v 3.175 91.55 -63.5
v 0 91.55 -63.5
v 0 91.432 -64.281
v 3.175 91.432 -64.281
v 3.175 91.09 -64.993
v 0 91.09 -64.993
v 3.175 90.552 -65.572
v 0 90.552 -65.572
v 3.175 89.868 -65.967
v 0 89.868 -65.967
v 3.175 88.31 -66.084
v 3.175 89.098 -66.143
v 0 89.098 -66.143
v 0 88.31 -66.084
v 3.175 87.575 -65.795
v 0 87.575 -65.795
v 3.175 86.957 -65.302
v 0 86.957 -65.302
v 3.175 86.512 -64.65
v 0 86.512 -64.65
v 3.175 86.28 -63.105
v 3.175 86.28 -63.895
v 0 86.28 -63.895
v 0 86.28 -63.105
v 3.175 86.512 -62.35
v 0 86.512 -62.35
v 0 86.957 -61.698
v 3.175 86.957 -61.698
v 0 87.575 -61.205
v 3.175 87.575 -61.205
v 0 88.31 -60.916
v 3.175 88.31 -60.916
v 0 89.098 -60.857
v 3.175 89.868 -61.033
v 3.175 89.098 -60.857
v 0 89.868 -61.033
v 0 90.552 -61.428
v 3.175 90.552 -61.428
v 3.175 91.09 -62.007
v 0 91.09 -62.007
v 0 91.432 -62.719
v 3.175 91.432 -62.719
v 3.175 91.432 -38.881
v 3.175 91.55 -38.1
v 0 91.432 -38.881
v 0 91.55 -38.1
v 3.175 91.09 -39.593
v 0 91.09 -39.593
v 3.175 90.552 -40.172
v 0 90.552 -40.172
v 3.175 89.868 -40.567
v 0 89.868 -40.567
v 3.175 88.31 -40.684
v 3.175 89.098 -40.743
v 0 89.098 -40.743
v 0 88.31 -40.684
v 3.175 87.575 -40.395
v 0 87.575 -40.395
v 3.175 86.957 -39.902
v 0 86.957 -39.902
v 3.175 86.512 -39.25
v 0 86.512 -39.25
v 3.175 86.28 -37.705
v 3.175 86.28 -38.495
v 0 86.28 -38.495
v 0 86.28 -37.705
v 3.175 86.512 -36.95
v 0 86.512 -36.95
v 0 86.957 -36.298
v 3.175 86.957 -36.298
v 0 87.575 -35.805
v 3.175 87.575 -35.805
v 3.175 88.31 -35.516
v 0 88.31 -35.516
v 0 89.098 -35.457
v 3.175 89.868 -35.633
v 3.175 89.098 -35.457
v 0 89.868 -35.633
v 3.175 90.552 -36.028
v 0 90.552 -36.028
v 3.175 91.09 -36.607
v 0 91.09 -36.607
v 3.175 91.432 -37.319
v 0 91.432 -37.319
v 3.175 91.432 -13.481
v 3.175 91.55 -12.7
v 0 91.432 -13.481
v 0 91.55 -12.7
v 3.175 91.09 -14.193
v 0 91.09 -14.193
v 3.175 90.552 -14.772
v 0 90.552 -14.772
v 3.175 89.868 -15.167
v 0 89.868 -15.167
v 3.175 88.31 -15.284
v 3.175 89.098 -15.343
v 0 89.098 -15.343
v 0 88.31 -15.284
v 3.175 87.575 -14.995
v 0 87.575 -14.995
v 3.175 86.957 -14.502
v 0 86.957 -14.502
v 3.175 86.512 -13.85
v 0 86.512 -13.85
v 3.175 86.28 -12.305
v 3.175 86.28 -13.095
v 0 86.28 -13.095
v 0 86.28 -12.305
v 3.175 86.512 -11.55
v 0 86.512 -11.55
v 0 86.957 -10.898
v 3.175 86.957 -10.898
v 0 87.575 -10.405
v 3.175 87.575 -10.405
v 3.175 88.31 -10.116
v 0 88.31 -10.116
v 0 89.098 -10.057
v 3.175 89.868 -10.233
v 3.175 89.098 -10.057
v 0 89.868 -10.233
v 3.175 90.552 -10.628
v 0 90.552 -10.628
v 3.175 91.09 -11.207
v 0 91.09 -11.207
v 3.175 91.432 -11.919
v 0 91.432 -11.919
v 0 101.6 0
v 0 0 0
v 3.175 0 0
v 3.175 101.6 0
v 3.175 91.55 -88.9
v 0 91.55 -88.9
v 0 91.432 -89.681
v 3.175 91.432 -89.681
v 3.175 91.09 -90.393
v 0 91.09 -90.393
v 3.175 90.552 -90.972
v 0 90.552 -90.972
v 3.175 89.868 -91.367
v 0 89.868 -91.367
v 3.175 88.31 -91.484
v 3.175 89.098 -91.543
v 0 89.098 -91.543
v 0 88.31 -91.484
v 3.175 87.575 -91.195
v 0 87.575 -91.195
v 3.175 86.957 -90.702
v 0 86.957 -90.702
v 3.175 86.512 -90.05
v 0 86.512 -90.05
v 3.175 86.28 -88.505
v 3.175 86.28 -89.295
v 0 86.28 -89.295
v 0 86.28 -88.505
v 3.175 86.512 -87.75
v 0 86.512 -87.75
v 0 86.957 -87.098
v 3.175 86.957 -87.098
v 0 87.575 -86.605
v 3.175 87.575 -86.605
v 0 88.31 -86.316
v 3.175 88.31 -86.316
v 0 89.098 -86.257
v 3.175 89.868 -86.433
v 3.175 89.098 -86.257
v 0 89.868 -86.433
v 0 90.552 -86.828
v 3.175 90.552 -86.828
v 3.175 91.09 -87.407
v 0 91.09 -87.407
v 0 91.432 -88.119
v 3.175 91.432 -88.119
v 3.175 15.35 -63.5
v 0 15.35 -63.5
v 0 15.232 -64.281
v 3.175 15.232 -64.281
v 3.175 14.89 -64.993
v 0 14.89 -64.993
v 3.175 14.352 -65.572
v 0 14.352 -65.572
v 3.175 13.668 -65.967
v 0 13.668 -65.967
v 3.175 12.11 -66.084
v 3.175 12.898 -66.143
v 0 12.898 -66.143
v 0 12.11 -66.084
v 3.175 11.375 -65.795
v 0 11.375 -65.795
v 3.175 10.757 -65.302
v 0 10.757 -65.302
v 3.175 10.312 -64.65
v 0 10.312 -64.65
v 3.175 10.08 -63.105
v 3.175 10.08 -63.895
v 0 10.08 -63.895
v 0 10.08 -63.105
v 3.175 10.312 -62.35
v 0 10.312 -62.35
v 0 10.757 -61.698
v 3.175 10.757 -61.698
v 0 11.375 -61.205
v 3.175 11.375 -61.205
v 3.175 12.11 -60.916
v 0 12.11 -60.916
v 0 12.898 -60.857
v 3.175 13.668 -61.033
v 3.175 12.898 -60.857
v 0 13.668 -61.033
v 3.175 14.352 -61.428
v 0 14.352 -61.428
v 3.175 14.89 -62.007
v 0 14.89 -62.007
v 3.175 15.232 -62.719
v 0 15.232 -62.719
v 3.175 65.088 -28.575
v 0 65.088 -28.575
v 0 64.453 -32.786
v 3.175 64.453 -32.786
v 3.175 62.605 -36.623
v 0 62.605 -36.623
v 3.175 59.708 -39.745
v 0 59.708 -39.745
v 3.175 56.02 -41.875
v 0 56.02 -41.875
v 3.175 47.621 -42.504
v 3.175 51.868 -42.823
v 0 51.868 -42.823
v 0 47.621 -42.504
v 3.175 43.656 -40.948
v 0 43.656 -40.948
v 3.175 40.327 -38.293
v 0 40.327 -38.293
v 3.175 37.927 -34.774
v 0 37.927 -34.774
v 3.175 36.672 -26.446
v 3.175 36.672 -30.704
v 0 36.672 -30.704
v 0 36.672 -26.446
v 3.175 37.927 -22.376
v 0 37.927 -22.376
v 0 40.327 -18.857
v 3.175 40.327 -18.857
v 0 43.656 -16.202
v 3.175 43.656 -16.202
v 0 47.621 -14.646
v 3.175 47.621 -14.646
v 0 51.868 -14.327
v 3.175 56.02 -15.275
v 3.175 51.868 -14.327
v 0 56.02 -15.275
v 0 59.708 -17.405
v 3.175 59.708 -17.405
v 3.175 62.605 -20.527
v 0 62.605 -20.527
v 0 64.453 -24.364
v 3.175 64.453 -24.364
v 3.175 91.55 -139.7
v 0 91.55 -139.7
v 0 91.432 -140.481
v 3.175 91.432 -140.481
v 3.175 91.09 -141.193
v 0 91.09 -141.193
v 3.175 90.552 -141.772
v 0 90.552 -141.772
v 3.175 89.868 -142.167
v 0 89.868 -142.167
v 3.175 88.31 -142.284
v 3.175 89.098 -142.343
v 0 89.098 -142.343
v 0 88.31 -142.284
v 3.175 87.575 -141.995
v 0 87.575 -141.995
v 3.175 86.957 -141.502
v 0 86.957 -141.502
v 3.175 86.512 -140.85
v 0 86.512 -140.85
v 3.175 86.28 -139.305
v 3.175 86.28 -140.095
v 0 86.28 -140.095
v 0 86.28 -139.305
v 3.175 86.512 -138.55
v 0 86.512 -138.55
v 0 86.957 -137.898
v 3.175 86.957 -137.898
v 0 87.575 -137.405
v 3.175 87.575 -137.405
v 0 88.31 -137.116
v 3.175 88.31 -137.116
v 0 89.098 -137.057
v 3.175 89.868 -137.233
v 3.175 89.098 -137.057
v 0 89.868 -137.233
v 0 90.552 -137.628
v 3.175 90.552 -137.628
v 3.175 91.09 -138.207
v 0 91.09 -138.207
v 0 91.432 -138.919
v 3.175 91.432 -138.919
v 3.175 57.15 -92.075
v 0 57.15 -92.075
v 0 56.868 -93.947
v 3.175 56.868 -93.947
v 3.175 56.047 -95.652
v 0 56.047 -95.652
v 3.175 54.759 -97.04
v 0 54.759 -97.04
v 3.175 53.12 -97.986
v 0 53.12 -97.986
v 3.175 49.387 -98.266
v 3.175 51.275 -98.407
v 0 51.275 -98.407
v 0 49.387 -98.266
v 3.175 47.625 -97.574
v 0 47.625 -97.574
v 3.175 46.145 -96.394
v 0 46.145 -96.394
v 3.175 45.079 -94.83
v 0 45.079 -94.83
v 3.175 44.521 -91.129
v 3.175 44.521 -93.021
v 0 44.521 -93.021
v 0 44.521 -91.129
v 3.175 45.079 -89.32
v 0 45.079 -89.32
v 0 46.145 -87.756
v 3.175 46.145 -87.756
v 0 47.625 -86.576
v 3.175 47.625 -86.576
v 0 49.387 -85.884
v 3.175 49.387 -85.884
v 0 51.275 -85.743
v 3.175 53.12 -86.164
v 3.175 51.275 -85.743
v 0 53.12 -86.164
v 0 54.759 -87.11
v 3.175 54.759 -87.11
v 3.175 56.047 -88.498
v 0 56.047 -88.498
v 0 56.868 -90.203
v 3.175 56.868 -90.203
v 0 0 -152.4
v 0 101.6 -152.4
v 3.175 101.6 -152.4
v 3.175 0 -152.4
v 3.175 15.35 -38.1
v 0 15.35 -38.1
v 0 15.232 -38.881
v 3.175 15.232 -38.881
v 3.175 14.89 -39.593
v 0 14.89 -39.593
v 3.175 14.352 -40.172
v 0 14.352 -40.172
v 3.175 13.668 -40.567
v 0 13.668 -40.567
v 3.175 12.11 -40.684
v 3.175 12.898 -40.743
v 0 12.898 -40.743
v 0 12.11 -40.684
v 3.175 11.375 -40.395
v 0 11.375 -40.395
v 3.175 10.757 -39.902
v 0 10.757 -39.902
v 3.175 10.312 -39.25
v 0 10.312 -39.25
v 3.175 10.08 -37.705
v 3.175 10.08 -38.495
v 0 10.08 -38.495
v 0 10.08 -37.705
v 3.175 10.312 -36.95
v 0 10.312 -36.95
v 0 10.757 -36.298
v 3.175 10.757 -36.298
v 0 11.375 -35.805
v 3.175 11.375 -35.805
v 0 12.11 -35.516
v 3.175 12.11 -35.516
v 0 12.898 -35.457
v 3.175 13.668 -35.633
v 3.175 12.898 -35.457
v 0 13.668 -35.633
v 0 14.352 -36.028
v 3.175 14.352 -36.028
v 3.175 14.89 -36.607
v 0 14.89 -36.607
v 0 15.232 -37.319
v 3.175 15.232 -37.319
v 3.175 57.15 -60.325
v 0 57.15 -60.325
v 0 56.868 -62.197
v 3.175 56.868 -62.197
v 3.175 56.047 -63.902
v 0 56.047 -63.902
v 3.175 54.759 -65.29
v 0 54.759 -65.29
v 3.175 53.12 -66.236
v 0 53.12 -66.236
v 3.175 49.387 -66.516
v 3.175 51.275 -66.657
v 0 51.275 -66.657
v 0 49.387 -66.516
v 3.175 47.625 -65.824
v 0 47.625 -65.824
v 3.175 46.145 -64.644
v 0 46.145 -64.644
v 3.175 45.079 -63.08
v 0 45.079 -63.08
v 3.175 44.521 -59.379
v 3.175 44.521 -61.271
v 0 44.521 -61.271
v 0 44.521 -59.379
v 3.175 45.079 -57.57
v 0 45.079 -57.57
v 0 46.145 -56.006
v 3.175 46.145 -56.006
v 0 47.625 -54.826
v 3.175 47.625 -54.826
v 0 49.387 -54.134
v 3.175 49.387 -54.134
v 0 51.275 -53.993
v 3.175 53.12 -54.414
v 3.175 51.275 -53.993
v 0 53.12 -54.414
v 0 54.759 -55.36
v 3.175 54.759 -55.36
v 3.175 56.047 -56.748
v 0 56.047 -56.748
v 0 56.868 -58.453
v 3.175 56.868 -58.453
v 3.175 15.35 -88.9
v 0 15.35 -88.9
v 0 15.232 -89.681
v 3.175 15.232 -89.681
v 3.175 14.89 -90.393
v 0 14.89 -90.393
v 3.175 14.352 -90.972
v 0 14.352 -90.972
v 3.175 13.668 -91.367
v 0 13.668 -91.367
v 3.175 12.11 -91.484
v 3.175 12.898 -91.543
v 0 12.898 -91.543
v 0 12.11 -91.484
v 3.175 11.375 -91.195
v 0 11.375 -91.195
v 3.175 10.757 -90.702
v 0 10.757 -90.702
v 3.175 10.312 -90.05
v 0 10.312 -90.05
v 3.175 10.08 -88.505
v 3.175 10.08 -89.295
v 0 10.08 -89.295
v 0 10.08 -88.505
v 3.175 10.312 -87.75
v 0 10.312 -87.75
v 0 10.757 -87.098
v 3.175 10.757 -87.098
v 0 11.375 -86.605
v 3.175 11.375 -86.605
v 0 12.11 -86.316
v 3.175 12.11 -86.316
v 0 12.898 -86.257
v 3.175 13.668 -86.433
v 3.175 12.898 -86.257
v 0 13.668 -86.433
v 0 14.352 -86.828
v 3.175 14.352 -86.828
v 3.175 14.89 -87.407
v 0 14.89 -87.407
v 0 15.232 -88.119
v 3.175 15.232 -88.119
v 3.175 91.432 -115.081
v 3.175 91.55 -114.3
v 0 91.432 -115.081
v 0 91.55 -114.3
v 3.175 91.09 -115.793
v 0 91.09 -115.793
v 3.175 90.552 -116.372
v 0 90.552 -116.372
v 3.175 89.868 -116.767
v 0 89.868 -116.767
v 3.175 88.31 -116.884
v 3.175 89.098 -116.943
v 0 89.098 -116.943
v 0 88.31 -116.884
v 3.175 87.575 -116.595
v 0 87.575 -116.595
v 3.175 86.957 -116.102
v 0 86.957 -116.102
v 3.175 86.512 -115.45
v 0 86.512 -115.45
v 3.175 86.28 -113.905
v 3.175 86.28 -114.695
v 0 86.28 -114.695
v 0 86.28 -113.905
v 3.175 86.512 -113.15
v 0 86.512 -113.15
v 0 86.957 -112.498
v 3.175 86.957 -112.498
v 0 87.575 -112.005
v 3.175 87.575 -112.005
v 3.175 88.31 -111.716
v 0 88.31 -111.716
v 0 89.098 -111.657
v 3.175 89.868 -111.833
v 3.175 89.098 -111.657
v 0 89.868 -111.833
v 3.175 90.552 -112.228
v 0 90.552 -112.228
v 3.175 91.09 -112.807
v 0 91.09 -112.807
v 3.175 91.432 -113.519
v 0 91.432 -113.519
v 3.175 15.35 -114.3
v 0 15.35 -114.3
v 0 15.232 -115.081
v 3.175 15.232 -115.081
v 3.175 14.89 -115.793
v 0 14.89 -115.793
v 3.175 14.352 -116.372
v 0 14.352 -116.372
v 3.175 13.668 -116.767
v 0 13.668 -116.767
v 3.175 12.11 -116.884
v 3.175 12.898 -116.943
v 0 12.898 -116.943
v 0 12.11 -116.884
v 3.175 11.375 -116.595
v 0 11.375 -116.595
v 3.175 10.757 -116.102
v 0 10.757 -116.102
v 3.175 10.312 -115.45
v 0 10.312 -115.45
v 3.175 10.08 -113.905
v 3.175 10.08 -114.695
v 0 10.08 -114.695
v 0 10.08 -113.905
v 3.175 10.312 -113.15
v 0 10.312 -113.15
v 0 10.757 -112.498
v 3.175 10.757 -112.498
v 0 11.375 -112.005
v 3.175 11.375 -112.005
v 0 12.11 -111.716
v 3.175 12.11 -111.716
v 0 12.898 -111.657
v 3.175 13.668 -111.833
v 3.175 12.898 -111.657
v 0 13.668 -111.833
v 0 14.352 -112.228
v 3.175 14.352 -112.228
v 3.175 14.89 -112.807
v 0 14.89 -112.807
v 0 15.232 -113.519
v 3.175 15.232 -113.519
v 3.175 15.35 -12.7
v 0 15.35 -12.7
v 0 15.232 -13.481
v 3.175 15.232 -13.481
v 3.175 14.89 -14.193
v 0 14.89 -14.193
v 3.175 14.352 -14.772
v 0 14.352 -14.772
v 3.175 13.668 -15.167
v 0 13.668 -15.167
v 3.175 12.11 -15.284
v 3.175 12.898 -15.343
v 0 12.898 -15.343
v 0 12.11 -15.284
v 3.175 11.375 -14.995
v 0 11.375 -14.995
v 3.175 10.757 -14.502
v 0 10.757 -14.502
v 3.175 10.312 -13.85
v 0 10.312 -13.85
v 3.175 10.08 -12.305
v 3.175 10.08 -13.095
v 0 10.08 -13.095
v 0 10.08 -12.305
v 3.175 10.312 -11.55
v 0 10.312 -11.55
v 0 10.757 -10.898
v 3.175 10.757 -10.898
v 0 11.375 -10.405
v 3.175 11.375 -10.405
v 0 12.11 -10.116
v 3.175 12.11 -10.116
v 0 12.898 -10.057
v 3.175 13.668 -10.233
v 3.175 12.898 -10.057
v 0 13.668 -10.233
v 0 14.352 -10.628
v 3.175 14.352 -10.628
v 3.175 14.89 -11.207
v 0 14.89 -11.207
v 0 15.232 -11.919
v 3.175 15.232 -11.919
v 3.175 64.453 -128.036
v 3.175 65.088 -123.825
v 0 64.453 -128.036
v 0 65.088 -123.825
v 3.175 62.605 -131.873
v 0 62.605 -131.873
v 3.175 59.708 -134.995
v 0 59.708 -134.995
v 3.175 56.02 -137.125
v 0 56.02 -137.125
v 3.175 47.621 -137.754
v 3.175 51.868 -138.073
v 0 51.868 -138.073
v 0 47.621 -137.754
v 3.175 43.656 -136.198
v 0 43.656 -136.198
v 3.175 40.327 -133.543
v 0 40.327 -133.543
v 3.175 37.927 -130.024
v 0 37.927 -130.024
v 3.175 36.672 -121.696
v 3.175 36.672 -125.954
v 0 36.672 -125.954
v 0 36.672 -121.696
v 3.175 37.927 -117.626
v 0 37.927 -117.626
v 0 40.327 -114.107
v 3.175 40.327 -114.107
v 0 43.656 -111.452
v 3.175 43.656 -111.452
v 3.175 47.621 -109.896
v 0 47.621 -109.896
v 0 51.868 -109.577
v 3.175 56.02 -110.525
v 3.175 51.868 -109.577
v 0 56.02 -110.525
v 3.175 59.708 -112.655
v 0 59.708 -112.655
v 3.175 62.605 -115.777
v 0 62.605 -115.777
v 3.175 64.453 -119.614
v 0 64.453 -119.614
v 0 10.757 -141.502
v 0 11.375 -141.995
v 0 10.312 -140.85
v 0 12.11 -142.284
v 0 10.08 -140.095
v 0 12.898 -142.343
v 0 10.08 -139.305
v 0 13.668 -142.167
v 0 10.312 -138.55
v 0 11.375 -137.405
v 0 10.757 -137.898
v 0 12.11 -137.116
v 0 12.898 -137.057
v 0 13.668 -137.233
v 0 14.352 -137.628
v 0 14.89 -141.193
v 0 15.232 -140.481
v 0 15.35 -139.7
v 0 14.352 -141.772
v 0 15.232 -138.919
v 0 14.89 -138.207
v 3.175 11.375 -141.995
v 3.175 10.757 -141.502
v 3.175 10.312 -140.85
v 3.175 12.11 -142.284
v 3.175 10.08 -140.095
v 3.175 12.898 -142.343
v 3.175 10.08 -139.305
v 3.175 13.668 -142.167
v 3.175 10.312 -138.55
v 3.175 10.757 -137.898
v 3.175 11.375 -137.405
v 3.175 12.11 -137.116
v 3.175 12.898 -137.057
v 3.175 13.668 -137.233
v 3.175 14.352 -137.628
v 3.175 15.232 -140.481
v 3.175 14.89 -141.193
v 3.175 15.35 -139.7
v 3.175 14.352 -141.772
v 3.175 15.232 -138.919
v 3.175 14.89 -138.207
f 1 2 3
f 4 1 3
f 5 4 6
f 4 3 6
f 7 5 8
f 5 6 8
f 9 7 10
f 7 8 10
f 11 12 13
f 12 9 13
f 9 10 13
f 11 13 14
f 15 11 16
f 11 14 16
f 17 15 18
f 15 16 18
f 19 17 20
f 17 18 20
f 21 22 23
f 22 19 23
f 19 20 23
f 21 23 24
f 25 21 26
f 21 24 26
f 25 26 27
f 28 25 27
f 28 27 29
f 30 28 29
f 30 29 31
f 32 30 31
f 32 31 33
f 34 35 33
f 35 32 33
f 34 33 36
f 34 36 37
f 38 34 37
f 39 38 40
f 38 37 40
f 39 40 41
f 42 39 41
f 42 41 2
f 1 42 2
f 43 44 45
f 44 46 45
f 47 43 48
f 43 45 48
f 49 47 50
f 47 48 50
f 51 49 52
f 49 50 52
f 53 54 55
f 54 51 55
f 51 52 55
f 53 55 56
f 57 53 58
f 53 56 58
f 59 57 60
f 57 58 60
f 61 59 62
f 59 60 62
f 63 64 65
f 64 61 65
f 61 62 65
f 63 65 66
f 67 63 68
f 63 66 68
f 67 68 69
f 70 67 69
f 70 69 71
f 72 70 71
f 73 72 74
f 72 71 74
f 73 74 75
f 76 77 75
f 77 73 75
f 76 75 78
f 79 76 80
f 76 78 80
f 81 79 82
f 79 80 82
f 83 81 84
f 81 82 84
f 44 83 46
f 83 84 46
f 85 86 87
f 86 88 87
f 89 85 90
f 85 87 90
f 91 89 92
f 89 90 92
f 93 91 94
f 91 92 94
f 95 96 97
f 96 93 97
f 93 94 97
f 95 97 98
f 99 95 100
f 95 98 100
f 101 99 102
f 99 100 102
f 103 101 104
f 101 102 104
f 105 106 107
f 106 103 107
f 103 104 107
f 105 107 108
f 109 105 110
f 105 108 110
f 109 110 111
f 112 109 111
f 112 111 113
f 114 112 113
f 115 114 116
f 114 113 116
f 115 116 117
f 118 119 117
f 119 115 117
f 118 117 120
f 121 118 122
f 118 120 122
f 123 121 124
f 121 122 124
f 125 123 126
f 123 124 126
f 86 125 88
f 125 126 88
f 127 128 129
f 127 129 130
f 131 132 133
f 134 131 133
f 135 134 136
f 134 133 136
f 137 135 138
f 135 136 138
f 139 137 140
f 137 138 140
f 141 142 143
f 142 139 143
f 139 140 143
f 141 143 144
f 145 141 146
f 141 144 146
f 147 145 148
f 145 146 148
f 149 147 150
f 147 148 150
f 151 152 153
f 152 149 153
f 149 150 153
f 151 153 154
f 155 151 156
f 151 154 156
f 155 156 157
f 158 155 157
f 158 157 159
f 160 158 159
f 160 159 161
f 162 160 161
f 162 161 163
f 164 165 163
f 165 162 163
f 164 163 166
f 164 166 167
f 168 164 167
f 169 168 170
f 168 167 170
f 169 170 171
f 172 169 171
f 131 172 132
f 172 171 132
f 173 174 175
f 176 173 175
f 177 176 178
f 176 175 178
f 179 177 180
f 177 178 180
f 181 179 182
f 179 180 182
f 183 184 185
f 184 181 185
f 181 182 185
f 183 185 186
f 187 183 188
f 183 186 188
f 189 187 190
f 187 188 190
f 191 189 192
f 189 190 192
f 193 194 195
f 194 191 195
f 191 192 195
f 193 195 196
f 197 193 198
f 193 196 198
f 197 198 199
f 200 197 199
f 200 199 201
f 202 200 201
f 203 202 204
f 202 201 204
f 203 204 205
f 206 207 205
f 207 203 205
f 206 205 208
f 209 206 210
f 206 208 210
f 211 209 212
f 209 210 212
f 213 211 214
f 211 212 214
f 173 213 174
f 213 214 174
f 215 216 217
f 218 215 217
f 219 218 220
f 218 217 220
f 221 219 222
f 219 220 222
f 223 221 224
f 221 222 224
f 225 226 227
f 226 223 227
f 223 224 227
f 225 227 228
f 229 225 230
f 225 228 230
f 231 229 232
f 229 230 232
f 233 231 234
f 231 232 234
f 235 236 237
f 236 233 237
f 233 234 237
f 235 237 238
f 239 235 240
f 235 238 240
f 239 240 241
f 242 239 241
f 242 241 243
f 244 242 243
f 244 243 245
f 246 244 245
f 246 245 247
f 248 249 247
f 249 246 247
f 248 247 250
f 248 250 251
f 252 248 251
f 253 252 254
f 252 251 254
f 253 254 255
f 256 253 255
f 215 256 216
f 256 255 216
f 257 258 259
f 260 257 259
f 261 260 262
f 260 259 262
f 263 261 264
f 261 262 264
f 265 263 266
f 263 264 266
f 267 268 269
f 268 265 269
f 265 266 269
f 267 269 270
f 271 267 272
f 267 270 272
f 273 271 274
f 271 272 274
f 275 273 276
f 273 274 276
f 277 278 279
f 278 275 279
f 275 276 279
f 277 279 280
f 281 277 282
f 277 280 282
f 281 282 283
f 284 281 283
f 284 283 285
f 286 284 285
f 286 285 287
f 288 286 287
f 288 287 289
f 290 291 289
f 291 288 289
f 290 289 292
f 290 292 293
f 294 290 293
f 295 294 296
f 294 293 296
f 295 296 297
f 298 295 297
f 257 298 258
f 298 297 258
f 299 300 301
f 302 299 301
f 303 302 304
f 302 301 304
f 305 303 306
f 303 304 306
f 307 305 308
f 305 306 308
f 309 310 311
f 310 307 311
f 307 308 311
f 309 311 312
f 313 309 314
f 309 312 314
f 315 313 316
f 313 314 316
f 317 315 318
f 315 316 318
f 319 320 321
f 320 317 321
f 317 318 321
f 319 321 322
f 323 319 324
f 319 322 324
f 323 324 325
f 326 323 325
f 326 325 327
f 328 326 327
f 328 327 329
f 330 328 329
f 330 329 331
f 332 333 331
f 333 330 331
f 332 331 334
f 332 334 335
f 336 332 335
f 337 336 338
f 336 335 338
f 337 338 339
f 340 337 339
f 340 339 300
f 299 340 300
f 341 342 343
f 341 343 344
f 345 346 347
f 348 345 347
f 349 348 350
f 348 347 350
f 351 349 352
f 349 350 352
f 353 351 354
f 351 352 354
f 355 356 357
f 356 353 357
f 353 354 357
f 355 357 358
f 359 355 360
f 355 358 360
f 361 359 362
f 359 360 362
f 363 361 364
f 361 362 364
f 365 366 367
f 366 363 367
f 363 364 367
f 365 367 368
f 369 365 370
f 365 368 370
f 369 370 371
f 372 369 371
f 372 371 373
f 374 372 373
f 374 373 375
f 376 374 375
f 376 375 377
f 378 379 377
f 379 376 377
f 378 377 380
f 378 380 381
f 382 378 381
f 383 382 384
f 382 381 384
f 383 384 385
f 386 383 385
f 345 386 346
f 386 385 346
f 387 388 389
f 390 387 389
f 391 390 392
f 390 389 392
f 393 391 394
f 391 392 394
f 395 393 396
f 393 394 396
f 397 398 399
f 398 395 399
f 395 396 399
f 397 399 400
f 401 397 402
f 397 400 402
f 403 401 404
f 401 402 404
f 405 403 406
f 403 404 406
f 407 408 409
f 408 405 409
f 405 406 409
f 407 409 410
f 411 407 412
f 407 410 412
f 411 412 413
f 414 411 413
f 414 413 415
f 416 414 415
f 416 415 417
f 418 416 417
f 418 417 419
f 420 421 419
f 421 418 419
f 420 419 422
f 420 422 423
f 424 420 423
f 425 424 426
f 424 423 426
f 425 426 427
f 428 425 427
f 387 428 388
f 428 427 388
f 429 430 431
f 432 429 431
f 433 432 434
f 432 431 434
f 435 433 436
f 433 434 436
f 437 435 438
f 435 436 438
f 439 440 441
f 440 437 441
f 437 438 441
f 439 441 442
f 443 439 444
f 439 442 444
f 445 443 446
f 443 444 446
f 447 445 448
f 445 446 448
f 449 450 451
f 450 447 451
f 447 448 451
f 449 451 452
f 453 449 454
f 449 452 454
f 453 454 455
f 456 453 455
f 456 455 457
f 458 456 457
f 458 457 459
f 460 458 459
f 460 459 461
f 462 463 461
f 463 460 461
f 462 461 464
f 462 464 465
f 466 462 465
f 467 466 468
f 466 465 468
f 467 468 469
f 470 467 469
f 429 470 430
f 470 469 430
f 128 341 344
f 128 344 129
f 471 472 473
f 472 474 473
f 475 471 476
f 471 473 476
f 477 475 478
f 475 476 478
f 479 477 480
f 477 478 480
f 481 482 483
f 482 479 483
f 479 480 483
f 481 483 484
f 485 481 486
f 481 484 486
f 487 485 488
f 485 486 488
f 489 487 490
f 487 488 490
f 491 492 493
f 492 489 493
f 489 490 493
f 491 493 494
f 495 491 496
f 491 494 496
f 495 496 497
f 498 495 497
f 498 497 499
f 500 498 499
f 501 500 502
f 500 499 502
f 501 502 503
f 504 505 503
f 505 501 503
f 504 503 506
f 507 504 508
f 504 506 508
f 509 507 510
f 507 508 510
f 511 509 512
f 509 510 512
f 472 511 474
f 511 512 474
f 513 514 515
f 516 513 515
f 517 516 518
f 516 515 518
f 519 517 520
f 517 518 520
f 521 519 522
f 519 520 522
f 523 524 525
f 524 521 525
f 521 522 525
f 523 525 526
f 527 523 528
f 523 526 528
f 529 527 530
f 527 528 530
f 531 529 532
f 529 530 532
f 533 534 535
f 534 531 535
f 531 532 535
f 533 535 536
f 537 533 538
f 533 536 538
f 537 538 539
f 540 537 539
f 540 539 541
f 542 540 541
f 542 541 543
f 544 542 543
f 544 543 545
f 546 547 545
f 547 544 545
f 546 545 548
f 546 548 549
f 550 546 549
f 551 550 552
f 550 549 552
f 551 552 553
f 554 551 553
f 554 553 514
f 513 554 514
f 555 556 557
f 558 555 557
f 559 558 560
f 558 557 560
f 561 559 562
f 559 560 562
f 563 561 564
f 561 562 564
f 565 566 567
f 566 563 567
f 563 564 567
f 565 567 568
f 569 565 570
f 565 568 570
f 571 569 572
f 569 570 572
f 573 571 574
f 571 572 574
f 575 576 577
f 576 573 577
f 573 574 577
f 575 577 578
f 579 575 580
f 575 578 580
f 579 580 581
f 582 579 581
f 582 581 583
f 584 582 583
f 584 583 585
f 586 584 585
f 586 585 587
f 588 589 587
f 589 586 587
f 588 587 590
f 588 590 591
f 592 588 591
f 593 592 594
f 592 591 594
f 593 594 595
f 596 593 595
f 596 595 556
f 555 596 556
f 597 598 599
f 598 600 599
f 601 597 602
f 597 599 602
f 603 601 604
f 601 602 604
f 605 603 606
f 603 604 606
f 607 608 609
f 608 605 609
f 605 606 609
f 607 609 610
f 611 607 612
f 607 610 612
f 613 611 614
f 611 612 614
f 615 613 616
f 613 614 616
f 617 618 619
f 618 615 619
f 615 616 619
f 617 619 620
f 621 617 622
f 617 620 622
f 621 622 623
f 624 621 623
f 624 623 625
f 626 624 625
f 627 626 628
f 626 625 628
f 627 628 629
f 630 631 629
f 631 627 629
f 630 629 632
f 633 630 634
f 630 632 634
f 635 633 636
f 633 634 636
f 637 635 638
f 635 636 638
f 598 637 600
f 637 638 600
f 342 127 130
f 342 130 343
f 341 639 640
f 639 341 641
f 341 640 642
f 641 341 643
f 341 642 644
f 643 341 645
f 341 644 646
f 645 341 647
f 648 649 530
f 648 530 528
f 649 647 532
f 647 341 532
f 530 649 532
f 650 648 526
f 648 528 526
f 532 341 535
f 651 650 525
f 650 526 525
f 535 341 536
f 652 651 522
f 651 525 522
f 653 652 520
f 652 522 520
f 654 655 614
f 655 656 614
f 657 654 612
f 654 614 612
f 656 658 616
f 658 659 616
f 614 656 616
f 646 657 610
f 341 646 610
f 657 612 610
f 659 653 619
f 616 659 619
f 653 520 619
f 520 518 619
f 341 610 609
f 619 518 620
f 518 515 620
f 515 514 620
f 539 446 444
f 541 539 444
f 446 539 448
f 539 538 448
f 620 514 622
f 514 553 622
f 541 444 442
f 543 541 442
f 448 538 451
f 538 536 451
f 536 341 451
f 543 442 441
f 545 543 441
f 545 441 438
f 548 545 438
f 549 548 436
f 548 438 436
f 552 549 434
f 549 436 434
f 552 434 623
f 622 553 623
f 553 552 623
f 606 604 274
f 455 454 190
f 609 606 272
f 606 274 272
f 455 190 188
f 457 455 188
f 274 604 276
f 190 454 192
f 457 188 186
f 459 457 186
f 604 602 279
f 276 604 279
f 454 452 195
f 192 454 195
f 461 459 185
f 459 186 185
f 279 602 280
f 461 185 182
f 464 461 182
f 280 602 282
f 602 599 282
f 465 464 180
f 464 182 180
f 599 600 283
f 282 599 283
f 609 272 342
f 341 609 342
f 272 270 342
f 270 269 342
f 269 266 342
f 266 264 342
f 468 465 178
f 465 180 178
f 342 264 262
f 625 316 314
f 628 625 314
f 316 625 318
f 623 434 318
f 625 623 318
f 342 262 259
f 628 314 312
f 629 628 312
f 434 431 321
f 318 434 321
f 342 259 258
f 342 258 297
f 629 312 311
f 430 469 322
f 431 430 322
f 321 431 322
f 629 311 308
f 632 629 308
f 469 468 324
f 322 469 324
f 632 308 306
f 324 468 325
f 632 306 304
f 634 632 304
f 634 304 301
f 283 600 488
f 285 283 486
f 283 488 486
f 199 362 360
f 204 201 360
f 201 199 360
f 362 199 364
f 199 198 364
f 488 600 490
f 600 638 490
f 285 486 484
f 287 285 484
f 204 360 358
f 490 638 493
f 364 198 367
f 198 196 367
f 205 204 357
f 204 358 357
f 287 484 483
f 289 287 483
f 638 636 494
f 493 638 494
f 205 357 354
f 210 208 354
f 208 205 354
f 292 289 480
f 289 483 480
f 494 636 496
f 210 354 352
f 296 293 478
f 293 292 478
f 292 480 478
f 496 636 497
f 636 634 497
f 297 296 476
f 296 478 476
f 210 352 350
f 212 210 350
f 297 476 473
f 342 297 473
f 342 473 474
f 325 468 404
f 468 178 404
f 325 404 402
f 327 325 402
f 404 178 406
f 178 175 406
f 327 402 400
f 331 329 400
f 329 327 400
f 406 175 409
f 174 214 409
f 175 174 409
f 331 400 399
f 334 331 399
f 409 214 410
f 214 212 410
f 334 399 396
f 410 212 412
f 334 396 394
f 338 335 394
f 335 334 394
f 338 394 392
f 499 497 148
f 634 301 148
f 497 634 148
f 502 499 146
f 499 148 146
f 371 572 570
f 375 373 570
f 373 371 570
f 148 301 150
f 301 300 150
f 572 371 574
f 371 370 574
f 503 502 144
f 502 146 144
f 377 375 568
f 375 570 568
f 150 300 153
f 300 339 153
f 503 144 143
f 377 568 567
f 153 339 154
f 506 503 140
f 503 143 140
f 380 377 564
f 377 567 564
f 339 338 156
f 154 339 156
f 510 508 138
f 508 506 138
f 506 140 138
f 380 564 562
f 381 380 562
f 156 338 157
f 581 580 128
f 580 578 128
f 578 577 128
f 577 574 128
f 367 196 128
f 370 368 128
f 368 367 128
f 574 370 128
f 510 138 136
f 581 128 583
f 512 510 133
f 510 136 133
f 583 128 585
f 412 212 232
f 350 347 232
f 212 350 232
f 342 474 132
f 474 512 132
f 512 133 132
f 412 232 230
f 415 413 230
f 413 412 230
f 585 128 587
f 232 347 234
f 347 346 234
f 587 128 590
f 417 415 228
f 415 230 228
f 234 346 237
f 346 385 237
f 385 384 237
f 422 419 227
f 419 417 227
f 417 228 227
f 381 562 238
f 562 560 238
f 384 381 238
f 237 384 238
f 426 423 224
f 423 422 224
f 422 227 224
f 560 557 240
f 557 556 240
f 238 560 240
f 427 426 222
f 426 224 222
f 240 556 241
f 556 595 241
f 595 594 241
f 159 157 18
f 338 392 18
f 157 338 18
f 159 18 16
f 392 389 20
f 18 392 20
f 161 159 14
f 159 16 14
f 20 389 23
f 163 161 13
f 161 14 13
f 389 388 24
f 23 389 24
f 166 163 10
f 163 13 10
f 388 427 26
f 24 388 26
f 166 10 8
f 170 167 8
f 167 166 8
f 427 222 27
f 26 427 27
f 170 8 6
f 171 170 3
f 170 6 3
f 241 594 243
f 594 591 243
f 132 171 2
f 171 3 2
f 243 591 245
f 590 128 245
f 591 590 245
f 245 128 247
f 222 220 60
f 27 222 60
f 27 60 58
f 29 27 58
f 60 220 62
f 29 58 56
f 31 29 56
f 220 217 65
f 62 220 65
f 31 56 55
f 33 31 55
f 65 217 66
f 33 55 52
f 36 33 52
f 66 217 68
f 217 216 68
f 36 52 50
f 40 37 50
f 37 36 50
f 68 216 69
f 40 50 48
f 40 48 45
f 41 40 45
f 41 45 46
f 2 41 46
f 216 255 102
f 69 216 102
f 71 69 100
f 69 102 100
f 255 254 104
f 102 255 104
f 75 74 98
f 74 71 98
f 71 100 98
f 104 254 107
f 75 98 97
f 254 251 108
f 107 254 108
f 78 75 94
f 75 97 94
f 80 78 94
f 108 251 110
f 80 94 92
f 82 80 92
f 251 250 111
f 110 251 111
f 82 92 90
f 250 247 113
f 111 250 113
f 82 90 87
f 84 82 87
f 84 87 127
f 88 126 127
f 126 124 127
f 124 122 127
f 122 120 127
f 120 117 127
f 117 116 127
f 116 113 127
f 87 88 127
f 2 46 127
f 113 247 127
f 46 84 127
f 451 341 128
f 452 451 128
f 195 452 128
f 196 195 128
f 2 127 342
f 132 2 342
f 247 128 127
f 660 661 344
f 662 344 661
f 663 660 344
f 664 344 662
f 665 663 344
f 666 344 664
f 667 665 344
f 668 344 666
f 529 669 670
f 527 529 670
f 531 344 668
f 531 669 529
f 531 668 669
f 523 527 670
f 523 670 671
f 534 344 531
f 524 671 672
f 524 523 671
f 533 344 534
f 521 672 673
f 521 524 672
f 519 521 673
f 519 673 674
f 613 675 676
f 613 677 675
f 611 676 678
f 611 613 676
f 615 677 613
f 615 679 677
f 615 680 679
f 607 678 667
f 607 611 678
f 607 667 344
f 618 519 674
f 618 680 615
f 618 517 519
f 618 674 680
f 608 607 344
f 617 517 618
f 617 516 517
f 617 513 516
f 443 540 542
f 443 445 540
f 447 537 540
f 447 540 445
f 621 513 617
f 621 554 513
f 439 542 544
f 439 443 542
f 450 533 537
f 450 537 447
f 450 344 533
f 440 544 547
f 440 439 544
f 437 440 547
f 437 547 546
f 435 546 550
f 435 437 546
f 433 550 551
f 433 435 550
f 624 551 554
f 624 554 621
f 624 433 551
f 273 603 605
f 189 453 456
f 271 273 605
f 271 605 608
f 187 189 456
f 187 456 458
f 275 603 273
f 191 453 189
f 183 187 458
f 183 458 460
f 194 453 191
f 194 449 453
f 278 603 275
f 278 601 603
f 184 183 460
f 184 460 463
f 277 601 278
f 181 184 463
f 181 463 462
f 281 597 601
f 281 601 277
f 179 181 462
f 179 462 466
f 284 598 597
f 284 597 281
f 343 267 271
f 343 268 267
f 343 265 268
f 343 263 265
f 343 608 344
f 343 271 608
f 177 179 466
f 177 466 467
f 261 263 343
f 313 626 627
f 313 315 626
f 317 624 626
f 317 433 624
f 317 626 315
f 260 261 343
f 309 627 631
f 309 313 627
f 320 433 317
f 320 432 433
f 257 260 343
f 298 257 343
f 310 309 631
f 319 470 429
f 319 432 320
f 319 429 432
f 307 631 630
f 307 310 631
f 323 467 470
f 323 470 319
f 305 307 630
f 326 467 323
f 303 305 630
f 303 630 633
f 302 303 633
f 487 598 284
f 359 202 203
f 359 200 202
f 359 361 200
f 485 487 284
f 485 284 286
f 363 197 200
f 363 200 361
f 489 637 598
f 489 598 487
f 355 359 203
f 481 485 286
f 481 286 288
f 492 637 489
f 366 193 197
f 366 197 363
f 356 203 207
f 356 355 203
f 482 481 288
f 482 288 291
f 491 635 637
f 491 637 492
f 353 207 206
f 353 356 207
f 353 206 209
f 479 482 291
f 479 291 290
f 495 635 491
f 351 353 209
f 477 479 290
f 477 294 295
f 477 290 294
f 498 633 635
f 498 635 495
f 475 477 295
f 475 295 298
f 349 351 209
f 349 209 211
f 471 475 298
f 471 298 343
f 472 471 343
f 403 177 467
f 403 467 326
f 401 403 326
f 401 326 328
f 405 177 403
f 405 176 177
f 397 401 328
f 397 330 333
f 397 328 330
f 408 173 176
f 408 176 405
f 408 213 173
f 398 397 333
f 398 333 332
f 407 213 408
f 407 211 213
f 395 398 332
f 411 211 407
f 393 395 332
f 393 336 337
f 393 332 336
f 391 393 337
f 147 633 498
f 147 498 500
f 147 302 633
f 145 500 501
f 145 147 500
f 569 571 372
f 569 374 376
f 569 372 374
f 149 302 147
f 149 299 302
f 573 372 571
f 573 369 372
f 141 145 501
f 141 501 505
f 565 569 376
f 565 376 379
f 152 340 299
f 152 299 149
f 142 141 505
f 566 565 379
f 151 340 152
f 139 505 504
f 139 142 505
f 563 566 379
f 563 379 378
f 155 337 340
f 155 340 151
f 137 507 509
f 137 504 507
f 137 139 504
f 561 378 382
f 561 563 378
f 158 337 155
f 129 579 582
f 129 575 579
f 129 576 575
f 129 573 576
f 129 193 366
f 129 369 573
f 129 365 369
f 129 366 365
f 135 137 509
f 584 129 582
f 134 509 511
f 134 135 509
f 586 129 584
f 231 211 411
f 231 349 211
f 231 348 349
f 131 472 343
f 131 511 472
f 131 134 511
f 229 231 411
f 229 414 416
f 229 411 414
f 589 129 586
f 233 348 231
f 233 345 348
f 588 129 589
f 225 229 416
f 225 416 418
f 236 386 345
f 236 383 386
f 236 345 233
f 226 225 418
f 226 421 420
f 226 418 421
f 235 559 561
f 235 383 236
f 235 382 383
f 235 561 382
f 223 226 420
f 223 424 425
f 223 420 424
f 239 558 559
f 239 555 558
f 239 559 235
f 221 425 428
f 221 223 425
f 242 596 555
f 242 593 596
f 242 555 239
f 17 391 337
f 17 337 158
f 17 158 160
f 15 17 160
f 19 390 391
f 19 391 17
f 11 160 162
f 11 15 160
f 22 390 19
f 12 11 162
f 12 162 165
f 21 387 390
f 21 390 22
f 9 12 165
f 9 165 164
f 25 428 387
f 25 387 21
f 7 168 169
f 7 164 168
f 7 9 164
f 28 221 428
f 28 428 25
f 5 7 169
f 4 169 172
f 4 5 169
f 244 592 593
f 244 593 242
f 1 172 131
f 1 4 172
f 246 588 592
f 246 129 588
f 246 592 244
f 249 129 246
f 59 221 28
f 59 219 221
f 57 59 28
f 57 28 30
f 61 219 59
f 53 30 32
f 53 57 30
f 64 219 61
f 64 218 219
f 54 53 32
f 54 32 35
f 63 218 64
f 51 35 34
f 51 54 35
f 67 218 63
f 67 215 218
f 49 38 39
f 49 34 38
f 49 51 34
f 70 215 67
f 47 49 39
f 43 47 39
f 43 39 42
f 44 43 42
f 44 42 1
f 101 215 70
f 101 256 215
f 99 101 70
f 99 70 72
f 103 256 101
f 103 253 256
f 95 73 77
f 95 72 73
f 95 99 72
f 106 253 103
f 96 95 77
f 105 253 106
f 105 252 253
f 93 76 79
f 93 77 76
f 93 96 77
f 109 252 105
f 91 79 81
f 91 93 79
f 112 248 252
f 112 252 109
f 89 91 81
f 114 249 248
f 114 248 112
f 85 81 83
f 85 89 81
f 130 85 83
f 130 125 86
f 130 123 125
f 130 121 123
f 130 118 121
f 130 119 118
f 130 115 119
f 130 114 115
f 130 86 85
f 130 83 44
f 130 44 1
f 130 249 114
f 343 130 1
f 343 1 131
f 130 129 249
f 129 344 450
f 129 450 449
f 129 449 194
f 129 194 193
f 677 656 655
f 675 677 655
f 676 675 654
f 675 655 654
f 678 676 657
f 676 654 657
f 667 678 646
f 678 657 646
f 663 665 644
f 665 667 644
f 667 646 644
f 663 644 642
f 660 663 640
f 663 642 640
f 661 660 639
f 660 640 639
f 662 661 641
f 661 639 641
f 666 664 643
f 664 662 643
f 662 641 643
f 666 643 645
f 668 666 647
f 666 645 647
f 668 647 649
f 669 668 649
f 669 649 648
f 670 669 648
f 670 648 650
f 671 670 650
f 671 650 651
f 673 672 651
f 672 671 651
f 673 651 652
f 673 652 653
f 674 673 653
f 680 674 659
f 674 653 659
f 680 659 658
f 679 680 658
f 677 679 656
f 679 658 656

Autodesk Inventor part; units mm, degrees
ref_plane "YZ Plane" through (0, 0, 0) normal (1, 0, 0) x (0, 1, 0)
ref_plane "XZ Plane" through (0, 0, 0) normal (0, 1, 0) x (-1, 0, 0)
ref_plane "XY Plane" through (0, 0, 0) normal (0, 0, 1) x (1, 0, 0)
sketch "Sketch1" plane through (0, 0, 0) normal (1, 0, 0) x (0, 1, 0)
  line L0 (0, 0) -> (101.6, 0)
  line L1 (101.6, 0) -> (101.6, -152.4)
  line L2 (101.6, -152.4) -> (0, -152.4)
  line L3 (0, -152.4) -> (0, 0)
  circle A0 centre (50.8, -28.575) radius 14.2875
  circle A1 centre (50.8, -60.325) radius 6.35
  circle A2 centre (50.8, -92.075) radius 6.35
  circle A3 centre (50.8, -123.825) radius 14.2875
  line L4 (50.8, -28.575) -> (50.8, -123.825) construction
  circle A4 centre (88.9, -12.7) radius 2.65
  circle A5 centre (88.9, -38.1) radius 2.65
  circle A6 centre (88.9, -63.5) radius 2.65
  circle A7 centre (88.9, -88.9) radius 2.65
  circle A8 centre (88.9, -114.3) radius 2.65
  circle A9 centre (88.9, -139.7) radius 2.65
  circle A10 centre (12.7, -12.7) radius 2.65
  circle A11 centre (12.7, -38.1) radius 2.65
  circle A12 centre (12.7, -63.5) radius 2.65
  circle A13 centre (12.7, -88.9) radius 2.65
  circle A14 centre (12.7, -114.3) radius 2.65
  circle A15 centre (12.7, -139.7) radius 2.65
  point P0 (101.6, -76.2)
  point P1 (50.8, -76.2)
  point P2 (50.8, -152.4)
  dimension "d0" = 101.6
  dimension "d1" = 152.4
  dimension "d2" = 28.575
  dimension "d3" = 12.7
  dimension "d4" = 12.7
  dimension "d5" = 28.575
  dimension "d6" = 31.75
  dimension "d7" = 31.75
  dimension "d8" = 31.75
  dimension "d9" = 5.3
  dimension "d10" = 12.7
  dimension "d11" = 12.7
  dimension "d14" = 25.4
  dimension "d17" = 76.2
extrude "Extrusion1" add sketch "Sketch1" along normal blind 3.175
equation "\"d7\" = d6"
equation "\"d8\" = d7"
properties part number "CH-1-02-RearGearboxHousingMotorSide" material "Aluminum 6061"
